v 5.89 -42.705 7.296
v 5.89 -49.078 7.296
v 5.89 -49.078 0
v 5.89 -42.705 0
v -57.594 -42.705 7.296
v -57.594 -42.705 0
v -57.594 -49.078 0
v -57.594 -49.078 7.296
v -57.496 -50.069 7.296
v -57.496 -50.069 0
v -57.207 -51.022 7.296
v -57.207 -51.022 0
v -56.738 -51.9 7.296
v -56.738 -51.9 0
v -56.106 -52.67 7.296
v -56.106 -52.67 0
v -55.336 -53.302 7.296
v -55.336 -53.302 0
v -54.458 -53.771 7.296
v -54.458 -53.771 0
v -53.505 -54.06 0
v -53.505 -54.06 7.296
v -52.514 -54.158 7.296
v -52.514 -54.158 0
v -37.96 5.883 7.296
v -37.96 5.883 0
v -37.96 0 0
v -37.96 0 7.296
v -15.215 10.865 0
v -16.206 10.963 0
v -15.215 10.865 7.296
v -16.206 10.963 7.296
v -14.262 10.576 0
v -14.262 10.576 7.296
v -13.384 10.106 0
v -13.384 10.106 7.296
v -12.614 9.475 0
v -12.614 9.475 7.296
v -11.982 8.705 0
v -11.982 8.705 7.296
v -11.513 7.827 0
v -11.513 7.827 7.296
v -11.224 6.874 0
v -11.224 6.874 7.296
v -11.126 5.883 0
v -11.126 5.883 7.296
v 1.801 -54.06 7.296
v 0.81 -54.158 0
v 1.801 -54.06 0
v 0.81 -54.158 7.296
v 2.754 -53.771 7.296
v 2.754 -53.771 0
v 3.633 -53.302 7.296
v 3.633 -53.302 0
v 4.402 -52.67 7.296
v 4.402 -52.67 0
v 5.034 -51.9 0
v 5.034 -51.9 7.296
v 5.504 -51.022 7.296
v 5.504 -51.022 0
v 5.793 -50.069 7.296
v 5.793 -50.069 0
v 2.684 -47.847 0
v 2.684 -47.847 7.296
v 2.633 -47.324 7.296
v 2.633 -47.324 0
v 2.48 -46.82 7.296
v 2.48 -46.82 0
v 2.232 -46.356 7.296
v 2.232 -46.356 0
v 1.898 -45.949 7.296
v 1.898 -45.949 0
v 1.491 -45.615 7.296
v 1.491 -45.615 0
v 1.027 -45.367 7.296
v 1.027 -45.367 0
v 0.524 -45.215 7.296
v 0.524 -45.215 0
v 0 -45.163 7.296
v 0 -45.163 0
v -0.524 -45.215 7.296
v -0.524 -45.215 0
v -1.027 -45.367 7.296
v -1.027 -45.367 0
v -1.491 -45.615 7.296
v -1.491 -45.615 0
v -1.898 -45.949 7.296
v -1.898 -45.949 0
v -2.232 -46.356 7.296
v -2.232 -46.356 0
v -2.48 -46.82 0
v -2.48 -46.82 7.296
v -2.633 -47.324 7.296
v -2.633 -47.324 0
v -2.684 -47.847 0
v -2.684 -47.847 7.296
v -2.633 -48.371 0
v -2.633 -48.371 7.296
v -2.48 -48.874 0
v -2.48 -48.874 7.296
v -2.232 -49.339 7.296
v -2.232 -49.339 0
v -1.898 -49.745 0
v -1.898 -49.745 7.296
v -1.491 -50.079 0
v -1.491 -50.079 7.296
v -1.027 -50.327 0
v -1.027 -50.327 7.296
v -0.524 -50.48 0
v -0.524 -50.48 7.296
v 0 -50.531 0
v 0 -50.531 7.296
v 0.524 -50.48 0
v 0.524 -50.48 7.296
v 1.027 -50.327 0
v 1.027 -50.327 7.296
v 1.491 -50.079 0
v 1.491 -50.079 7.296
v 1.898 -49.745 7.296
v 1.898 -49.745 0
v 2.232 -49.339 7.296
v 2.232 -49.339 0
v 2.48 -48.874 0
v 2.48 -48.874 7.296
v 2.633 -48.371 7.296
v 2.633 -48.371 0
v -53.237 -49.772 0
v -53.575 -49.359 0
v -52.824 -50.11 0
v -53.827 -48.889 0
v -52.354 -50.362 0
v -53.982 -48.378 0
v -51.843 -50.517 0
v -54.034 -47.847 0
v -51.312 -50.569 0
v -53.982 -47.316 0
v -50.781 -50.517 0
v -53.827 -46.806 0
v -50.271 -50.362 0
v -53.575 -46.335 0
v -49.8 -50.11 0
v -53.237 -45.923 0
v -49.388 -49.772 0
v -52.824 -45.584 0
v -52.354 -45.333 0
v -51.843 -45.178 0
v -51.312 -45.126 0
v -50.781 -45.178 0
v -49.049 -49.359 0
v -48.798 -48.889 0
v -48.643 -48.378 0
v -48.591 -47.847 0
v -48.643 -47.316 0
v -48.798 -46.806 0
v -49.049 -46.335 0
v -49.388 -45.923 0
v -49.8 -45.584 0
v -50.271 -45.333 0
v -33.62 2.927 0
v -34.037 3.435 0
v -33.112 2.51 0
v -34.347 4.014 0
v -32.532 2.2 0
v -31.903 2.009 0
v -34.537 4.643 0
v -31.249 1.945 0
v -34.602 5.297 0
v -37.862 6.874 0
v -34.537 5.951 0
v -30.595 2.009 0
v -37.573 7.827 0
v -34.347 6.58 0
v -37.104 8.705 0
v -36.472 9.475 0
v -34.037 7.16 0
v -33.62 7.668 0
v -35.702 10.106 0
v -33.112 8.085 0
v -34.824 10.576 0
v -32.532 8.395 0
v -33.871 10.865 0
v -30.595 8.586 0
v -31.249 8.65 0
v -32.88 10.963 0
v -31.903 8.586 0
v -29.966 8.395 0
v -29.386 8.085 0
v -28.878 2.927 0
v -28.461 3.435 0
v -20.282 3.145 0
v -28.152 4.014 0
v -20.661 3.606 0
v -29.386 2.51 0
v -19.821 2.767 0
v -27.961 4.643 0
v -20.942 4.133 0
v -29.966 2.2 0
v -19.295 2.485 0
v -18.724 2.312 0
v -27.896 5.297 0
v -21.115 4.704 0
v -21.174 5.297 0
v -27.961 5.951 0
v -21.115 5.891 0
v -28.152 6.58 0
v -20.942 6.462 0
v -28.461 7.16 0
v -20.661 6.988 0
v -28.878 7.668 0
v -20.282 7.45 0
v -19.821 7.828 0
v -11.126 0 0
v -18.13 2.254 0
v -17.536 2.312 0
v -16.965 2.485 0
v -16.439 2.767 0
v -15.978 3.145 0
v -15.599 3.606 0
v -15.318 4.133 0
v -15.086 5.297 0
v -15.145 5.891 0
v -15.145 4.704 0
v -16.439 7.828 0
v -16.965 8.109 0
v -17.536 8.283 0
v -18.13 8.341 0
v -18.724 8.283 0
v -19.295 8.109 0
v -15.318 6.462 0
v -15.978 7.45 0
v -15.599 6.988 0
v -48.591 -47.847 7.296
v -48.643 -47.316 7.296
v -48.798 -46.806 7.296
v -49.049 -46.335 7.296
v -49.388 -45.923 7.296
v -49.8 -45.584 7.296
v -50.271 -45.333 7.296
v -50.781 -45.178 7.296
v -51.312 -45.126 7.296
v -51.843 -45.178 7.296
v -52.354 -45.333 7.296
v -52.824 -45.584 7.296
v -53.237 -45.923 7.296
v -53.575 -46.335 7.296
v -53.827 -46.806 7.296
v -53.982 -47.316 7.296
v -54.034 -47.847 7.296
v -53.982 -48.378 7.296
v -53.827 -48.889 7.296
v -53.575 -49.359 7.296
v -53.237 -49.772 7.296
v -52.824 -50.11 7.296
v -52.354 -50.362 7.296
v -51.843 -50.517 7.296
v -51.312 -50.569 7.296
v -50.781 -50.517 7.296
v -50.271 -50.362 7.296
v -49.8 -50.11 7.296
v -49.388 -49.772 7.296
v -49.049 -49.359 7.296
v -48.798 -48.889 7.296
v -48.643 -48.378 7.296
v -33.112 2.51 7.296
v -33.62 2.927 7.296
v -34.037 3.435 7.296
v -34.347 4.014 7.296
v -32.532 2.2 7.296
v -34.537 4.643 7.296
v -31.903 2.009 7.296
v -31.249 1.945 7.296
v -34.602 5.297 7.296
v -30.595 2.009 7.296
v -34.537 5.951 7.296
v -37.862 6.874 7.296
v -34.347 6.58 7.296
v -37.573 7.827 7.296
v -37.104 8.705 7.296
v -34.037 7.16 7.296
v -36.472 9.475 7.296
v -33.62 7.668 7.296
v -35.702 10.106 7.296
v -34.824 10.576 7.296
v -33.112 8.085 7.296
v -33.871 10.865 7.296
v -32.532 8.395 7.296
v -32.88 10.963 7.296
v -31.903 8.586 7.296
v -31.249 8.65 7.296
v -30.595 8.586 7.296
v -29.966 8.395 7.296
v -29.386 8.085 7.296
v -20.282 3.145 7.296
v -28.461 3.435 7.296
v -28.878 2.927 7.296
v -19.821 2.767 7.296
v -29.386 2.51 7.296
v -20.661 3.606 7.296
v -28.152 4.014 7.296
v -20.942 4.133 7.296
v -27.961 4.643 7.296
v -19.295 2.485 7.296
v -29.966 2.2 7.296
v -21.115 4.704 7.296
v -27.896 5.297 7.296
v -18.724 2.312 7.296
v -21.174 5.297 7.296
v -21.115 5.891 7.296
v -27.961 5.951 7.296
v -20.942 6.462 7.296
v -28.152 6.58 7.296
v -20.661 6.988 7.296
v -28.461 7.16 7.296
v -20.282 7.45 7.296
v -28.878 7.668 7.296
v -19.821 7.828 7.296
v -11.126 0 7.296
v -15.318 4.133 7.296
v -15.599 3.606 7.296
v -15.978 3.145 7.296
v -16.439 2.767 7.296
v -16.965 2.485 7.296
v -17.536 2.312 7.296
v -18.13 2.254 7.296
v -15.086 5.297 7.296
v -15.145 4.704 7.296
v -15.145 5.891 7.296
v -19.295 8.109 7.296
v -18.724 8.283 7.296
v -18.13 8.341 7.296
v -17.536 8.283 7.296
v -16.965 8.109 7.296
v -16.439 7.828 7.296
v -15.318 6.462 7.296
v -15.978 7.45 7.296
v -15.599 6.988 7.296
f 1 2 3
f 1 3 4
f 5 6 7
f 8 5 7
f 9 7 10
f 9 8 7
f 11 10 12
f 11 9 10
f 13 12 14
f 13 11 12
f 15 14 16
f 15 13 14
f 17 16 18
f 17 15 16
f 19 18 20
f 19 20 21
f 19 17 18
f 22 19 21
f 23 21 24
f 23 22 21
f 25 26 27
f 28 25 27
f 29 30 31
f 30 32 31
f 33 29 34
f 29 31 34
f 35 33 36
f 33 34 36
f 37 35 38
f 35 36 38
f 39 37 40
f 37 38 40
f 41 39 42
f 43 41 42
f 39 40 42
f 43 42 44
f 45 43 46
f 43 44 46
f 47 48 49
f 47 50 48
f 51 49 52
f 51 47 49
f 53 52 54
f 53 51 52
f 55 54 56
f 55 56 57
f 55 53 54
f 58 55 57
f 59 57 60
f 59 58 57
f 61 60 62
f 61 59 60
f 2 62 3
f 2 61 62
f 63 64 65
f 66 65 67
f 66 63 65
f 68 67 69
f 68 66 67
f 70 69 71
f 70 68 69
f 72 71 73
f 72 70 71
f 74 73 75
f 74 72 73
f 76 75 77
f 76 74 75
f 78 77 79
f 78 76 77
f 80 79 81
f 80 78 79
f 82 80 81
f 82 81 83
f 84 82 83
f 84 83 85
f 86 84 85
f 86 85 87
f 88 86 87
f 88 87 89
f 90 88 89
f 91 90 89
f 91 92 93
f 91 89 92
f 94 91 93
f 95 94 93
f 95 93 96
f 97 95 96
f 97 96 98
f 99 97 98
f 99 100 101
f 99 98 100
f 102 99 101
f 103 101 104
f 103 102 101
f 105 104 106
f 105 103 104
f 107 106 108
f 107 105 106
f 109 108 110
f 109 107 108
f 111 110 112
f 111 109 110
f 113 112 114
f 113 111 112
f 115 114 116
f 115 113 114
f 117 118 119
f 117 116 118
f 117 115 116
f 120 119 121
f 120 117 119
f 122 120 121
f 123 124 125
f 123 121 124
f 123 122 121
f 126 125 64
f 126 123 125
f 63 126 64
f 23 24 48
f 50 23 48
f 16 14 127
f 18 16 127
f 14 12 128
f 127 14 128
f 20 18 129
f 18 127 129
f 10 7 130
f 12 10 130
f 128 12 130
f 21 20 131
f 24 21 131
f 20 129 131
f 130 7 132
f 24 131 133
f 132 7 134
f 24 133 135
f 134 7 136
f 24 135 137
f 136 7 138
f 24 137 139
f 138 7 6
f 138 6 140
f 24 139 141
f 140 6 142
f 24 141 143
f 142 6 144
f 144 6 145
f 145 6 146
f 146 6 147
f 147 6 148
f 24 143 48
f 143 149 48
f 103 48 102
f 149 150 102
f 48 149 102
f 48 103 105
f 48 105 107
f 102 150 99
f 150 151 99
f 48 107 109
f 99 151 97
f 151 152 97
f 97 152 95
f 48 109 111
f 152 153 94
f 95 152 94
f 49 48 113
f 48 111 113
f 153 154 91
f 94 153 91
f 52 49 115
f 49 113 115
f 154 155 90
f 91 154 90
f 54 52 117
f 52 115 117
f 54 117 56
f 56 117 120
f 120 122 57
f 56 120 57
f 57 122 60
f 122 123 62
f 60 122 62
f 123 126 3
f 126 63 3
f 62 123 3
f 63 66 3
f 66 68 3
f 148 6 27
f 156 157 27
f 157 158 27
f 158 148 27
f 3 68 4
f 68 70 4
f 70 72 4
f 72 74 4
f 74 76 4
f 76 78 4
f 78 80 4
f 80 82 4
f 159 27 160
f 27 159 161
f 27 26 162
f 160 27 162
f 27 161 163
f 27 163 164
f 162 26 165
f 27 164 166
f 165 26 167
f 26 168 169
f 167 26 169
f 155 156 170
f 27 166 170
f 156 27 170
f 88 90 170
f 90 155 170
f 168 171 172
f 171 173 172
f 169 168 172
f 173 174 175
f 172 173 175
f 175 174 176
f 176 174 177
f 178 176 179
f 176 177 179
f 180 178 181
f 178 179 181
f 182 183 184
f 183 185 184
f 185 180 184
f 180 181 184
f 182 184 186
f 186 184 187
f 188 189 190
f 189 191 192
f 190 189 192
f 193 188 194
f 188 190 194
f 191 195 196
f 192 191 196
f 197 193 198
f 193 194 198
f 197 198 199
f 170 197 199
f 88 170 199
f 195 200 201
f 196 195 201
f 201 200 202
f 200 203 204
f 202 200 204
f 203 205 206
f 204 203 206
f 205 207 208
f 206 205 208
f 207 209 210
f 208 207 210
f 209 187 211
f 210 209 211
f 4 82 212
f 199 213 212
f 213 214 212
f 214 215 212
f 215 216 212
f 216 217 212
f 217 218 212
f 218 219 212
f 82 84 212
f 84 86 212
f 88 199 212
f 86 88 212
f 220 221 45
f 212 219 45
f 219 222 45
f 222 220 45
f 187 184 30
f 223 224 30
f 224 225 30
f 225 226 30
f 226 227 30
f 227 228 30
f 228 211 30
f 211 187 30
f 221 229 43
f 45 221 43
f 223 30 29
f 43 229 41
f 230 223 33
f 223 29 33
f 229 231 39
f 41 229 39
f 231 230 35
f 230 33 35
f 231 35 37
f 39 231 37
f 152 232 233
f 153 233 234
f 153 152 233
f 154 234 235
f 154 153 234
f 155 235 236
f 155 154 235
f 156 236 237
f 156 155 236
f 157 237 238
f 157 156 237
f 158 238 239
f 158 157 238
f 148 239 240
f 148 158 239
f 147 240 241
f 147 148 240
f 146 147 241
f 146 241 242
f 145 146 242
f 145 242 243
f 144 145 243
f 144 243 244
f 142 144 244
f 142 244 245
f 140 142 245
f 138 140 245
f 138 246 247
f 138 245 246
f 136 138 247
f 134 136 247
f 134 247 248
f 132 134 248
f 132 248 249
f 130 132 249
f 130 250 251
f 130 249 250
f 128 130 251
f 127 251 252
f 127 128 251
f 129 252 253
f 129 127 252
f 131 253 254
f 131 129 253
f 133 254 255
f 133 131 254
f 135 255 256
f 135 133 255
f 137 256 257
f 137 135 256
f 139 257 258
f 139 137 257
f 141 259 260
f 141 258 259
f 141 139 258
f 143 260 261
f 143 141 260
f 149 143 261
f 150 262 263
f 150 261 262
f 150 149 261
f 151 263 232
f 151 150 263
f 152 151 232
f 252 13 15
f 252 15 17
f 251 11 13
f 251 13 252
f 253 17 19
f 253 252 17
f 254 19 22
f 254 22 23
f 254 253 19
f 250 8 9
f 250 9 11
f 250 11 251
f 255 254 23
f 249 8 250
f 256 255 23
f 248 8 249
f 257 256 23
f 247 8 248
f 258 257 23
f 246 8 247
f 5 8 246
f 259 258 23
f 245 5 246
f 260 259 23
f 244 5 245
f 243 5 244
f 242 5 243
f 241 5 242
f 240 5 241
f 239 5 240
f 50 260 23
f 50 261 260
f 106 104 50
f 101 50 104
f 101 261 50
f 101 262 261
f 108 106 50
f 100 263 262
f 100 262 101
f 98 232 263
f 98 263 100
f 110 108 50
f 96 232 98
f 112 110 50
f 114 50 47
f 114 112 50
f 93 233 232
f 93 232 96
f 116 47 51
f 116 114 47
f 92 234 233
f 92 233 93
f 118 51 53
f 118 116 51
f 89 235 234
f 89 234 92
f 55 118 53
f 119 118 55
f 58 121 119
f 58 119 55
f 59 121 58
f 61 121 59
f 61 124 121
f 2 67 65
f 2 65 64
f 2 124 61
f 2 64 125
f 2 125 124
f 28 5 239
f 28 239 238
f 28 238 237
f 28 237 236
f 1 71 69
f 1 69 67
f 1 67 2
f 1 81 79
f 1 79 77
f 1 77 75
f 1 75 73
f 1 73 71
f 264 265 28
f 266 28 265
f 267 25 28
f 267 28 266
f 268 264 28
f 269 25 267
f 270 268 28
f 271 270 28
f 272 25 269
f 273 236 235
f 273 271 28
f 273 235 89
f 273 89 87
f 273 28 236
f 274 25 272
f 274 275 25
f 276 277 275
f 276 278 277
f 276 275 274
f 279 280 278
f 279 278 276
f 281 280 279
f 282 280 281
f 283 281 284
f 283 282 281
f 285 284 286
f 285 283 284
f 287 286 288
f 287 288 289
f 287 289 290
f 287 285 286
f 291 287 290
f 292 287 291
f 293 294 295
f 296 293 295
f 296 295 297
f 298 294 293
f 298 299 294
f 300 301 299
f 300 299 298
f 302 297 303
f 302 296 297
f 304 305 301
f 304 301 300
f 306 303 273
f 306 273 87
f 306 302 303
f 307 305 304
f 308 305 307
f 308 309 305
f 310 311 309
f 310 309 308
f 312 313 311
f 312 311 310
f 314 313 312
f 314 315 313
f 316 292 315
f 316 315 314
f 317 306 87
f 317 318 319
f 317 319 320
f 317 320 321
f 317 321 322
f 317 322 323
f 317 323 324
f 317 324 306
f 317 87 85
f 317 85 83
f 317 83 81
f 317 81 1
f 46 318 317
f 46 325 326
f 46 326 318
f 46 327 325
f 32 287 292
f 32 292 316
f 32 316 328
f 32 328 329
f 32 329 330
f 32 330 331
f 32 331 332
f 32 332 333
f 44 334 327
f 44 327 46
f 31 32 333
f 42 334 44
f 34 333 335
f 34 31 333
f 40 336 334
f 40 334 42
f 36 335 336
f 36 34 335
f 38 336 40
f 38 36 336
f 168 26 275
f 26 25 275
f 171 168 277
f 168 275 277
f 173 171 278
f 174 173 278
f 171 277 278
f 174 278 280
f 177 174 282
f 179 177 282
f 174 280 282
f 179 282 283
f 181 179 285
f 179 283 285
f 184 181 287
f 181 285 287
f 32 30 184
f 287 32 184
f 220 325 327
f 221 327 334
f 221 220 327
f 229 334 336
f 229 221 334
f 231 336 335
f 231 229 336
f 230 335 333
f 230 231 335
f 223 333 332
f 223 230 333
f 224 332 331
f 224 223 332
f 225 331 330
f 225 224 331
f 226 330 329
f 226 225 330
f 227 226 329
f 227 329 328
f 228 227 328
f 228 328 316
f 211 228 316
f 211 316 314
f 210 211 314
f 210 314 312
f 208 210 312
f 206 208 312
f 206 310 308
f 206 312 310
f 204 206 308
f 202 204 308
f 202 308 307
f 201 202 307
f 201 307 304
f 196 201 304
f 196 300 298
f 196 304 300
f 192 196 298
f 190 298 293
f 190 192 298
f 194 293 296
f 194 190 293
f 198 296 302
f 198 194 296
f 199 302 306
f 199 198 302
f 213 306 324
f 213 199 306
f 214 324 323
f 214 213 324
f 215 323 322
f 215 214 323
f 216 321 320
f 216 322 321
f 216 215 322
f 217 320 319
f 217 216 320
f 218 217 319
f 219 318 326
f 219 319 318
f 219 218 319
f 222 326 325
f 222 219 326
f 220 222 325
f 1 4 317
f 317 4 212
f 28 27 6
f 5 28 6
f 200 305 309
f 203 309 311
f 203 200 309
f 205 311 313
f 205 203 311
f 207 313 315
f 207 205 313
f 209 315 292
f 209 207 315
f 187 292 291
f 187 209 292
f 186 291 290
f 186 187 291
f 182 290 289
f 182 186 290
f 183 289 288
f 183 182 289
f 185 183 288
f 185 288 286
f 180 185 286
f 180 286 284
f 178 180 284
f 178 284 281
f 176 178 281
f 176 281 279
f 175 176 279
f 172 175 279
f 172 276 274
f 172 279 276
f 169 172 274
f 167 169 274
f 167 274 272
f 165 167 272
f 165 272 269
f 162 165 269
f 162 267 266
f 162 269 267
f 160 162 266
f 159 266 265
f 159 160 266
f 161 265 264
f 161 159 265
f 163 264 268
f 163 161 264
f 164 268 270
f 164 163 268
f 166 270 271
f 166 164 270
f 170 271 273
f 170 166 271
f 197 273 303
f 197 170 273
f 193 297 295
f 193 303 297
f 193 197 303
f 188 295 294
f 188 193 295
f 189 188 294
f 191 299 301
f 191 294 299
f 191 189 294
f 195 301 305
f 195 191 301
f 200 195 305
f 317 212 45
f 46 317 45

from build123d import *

# Parameters (mm, degrees)
F1_DEPTH = 7.29556
F2_R     = 3.352676
F2_R_2   = 3.043736
F3_DEPTH = 25.4
F4_R     = 2.721631
F4_R_2   = 2.684235
F5_DEPTH = 25.4
F6_R     = 5.08
F7_R     = 5.08


with BuildPart() as f1:
    # F0 (on Top) → F1 (new body)
    with BuildSketch(Plane.XY):
        Polygon((-57.594109, -42.704724), (-57.594109, -54.158099), (5.890307, -54.158099), (5.890307, -42.704724), (-11.126135, 0), (-11.126135, 10.962515), (-37.959754, 10.962515), (-37.959754, 0), align=None)
    extrude(amount=F1_DEPTH)

    # F2 (on Top) → F3 (cut)
    with BuildSketch(Plane.XY):
        with Locations((-31.249143, 5.297316)):
            Circle(F2_R)
        with Locations((-18.129976, 5.297316)):
            Circle(F2_R_2)
    extrude(amount=F3_DEPTH, mode=Mode.SUBTRACT)

    # F4 (on Top) → F5 (cut)
    with BuildSketch(Plane.XY):
        with Locations((-51.31226, -47.847249)):
            Circle(F4_R)
        with Locations((0, -47.847249)):
            Circle(F4_R_2)
    extrude(amount=F5_DEPTH, mode=Mode.SUBTRACT)

    # F6
    f6_edges = [f1.edges().sort_by_distance(p)[0] for p in [
        (-57.594109, -54.158099, 3.64778),
        (5.890307, -54.158099, 3.64778),
    ]]
    fillet(f6_edges, radius=F6_R)

    # F7
    f7_edges = [f1.edges().sort_by_distance(p)[0] for p in [
        (-37.959754, 10.962515, 3.64778),
        (-11.126135, 10.962515, 3.64778),
    ]]
    fillet(f7_edges, radius=F7_R)


solid = f1.part
